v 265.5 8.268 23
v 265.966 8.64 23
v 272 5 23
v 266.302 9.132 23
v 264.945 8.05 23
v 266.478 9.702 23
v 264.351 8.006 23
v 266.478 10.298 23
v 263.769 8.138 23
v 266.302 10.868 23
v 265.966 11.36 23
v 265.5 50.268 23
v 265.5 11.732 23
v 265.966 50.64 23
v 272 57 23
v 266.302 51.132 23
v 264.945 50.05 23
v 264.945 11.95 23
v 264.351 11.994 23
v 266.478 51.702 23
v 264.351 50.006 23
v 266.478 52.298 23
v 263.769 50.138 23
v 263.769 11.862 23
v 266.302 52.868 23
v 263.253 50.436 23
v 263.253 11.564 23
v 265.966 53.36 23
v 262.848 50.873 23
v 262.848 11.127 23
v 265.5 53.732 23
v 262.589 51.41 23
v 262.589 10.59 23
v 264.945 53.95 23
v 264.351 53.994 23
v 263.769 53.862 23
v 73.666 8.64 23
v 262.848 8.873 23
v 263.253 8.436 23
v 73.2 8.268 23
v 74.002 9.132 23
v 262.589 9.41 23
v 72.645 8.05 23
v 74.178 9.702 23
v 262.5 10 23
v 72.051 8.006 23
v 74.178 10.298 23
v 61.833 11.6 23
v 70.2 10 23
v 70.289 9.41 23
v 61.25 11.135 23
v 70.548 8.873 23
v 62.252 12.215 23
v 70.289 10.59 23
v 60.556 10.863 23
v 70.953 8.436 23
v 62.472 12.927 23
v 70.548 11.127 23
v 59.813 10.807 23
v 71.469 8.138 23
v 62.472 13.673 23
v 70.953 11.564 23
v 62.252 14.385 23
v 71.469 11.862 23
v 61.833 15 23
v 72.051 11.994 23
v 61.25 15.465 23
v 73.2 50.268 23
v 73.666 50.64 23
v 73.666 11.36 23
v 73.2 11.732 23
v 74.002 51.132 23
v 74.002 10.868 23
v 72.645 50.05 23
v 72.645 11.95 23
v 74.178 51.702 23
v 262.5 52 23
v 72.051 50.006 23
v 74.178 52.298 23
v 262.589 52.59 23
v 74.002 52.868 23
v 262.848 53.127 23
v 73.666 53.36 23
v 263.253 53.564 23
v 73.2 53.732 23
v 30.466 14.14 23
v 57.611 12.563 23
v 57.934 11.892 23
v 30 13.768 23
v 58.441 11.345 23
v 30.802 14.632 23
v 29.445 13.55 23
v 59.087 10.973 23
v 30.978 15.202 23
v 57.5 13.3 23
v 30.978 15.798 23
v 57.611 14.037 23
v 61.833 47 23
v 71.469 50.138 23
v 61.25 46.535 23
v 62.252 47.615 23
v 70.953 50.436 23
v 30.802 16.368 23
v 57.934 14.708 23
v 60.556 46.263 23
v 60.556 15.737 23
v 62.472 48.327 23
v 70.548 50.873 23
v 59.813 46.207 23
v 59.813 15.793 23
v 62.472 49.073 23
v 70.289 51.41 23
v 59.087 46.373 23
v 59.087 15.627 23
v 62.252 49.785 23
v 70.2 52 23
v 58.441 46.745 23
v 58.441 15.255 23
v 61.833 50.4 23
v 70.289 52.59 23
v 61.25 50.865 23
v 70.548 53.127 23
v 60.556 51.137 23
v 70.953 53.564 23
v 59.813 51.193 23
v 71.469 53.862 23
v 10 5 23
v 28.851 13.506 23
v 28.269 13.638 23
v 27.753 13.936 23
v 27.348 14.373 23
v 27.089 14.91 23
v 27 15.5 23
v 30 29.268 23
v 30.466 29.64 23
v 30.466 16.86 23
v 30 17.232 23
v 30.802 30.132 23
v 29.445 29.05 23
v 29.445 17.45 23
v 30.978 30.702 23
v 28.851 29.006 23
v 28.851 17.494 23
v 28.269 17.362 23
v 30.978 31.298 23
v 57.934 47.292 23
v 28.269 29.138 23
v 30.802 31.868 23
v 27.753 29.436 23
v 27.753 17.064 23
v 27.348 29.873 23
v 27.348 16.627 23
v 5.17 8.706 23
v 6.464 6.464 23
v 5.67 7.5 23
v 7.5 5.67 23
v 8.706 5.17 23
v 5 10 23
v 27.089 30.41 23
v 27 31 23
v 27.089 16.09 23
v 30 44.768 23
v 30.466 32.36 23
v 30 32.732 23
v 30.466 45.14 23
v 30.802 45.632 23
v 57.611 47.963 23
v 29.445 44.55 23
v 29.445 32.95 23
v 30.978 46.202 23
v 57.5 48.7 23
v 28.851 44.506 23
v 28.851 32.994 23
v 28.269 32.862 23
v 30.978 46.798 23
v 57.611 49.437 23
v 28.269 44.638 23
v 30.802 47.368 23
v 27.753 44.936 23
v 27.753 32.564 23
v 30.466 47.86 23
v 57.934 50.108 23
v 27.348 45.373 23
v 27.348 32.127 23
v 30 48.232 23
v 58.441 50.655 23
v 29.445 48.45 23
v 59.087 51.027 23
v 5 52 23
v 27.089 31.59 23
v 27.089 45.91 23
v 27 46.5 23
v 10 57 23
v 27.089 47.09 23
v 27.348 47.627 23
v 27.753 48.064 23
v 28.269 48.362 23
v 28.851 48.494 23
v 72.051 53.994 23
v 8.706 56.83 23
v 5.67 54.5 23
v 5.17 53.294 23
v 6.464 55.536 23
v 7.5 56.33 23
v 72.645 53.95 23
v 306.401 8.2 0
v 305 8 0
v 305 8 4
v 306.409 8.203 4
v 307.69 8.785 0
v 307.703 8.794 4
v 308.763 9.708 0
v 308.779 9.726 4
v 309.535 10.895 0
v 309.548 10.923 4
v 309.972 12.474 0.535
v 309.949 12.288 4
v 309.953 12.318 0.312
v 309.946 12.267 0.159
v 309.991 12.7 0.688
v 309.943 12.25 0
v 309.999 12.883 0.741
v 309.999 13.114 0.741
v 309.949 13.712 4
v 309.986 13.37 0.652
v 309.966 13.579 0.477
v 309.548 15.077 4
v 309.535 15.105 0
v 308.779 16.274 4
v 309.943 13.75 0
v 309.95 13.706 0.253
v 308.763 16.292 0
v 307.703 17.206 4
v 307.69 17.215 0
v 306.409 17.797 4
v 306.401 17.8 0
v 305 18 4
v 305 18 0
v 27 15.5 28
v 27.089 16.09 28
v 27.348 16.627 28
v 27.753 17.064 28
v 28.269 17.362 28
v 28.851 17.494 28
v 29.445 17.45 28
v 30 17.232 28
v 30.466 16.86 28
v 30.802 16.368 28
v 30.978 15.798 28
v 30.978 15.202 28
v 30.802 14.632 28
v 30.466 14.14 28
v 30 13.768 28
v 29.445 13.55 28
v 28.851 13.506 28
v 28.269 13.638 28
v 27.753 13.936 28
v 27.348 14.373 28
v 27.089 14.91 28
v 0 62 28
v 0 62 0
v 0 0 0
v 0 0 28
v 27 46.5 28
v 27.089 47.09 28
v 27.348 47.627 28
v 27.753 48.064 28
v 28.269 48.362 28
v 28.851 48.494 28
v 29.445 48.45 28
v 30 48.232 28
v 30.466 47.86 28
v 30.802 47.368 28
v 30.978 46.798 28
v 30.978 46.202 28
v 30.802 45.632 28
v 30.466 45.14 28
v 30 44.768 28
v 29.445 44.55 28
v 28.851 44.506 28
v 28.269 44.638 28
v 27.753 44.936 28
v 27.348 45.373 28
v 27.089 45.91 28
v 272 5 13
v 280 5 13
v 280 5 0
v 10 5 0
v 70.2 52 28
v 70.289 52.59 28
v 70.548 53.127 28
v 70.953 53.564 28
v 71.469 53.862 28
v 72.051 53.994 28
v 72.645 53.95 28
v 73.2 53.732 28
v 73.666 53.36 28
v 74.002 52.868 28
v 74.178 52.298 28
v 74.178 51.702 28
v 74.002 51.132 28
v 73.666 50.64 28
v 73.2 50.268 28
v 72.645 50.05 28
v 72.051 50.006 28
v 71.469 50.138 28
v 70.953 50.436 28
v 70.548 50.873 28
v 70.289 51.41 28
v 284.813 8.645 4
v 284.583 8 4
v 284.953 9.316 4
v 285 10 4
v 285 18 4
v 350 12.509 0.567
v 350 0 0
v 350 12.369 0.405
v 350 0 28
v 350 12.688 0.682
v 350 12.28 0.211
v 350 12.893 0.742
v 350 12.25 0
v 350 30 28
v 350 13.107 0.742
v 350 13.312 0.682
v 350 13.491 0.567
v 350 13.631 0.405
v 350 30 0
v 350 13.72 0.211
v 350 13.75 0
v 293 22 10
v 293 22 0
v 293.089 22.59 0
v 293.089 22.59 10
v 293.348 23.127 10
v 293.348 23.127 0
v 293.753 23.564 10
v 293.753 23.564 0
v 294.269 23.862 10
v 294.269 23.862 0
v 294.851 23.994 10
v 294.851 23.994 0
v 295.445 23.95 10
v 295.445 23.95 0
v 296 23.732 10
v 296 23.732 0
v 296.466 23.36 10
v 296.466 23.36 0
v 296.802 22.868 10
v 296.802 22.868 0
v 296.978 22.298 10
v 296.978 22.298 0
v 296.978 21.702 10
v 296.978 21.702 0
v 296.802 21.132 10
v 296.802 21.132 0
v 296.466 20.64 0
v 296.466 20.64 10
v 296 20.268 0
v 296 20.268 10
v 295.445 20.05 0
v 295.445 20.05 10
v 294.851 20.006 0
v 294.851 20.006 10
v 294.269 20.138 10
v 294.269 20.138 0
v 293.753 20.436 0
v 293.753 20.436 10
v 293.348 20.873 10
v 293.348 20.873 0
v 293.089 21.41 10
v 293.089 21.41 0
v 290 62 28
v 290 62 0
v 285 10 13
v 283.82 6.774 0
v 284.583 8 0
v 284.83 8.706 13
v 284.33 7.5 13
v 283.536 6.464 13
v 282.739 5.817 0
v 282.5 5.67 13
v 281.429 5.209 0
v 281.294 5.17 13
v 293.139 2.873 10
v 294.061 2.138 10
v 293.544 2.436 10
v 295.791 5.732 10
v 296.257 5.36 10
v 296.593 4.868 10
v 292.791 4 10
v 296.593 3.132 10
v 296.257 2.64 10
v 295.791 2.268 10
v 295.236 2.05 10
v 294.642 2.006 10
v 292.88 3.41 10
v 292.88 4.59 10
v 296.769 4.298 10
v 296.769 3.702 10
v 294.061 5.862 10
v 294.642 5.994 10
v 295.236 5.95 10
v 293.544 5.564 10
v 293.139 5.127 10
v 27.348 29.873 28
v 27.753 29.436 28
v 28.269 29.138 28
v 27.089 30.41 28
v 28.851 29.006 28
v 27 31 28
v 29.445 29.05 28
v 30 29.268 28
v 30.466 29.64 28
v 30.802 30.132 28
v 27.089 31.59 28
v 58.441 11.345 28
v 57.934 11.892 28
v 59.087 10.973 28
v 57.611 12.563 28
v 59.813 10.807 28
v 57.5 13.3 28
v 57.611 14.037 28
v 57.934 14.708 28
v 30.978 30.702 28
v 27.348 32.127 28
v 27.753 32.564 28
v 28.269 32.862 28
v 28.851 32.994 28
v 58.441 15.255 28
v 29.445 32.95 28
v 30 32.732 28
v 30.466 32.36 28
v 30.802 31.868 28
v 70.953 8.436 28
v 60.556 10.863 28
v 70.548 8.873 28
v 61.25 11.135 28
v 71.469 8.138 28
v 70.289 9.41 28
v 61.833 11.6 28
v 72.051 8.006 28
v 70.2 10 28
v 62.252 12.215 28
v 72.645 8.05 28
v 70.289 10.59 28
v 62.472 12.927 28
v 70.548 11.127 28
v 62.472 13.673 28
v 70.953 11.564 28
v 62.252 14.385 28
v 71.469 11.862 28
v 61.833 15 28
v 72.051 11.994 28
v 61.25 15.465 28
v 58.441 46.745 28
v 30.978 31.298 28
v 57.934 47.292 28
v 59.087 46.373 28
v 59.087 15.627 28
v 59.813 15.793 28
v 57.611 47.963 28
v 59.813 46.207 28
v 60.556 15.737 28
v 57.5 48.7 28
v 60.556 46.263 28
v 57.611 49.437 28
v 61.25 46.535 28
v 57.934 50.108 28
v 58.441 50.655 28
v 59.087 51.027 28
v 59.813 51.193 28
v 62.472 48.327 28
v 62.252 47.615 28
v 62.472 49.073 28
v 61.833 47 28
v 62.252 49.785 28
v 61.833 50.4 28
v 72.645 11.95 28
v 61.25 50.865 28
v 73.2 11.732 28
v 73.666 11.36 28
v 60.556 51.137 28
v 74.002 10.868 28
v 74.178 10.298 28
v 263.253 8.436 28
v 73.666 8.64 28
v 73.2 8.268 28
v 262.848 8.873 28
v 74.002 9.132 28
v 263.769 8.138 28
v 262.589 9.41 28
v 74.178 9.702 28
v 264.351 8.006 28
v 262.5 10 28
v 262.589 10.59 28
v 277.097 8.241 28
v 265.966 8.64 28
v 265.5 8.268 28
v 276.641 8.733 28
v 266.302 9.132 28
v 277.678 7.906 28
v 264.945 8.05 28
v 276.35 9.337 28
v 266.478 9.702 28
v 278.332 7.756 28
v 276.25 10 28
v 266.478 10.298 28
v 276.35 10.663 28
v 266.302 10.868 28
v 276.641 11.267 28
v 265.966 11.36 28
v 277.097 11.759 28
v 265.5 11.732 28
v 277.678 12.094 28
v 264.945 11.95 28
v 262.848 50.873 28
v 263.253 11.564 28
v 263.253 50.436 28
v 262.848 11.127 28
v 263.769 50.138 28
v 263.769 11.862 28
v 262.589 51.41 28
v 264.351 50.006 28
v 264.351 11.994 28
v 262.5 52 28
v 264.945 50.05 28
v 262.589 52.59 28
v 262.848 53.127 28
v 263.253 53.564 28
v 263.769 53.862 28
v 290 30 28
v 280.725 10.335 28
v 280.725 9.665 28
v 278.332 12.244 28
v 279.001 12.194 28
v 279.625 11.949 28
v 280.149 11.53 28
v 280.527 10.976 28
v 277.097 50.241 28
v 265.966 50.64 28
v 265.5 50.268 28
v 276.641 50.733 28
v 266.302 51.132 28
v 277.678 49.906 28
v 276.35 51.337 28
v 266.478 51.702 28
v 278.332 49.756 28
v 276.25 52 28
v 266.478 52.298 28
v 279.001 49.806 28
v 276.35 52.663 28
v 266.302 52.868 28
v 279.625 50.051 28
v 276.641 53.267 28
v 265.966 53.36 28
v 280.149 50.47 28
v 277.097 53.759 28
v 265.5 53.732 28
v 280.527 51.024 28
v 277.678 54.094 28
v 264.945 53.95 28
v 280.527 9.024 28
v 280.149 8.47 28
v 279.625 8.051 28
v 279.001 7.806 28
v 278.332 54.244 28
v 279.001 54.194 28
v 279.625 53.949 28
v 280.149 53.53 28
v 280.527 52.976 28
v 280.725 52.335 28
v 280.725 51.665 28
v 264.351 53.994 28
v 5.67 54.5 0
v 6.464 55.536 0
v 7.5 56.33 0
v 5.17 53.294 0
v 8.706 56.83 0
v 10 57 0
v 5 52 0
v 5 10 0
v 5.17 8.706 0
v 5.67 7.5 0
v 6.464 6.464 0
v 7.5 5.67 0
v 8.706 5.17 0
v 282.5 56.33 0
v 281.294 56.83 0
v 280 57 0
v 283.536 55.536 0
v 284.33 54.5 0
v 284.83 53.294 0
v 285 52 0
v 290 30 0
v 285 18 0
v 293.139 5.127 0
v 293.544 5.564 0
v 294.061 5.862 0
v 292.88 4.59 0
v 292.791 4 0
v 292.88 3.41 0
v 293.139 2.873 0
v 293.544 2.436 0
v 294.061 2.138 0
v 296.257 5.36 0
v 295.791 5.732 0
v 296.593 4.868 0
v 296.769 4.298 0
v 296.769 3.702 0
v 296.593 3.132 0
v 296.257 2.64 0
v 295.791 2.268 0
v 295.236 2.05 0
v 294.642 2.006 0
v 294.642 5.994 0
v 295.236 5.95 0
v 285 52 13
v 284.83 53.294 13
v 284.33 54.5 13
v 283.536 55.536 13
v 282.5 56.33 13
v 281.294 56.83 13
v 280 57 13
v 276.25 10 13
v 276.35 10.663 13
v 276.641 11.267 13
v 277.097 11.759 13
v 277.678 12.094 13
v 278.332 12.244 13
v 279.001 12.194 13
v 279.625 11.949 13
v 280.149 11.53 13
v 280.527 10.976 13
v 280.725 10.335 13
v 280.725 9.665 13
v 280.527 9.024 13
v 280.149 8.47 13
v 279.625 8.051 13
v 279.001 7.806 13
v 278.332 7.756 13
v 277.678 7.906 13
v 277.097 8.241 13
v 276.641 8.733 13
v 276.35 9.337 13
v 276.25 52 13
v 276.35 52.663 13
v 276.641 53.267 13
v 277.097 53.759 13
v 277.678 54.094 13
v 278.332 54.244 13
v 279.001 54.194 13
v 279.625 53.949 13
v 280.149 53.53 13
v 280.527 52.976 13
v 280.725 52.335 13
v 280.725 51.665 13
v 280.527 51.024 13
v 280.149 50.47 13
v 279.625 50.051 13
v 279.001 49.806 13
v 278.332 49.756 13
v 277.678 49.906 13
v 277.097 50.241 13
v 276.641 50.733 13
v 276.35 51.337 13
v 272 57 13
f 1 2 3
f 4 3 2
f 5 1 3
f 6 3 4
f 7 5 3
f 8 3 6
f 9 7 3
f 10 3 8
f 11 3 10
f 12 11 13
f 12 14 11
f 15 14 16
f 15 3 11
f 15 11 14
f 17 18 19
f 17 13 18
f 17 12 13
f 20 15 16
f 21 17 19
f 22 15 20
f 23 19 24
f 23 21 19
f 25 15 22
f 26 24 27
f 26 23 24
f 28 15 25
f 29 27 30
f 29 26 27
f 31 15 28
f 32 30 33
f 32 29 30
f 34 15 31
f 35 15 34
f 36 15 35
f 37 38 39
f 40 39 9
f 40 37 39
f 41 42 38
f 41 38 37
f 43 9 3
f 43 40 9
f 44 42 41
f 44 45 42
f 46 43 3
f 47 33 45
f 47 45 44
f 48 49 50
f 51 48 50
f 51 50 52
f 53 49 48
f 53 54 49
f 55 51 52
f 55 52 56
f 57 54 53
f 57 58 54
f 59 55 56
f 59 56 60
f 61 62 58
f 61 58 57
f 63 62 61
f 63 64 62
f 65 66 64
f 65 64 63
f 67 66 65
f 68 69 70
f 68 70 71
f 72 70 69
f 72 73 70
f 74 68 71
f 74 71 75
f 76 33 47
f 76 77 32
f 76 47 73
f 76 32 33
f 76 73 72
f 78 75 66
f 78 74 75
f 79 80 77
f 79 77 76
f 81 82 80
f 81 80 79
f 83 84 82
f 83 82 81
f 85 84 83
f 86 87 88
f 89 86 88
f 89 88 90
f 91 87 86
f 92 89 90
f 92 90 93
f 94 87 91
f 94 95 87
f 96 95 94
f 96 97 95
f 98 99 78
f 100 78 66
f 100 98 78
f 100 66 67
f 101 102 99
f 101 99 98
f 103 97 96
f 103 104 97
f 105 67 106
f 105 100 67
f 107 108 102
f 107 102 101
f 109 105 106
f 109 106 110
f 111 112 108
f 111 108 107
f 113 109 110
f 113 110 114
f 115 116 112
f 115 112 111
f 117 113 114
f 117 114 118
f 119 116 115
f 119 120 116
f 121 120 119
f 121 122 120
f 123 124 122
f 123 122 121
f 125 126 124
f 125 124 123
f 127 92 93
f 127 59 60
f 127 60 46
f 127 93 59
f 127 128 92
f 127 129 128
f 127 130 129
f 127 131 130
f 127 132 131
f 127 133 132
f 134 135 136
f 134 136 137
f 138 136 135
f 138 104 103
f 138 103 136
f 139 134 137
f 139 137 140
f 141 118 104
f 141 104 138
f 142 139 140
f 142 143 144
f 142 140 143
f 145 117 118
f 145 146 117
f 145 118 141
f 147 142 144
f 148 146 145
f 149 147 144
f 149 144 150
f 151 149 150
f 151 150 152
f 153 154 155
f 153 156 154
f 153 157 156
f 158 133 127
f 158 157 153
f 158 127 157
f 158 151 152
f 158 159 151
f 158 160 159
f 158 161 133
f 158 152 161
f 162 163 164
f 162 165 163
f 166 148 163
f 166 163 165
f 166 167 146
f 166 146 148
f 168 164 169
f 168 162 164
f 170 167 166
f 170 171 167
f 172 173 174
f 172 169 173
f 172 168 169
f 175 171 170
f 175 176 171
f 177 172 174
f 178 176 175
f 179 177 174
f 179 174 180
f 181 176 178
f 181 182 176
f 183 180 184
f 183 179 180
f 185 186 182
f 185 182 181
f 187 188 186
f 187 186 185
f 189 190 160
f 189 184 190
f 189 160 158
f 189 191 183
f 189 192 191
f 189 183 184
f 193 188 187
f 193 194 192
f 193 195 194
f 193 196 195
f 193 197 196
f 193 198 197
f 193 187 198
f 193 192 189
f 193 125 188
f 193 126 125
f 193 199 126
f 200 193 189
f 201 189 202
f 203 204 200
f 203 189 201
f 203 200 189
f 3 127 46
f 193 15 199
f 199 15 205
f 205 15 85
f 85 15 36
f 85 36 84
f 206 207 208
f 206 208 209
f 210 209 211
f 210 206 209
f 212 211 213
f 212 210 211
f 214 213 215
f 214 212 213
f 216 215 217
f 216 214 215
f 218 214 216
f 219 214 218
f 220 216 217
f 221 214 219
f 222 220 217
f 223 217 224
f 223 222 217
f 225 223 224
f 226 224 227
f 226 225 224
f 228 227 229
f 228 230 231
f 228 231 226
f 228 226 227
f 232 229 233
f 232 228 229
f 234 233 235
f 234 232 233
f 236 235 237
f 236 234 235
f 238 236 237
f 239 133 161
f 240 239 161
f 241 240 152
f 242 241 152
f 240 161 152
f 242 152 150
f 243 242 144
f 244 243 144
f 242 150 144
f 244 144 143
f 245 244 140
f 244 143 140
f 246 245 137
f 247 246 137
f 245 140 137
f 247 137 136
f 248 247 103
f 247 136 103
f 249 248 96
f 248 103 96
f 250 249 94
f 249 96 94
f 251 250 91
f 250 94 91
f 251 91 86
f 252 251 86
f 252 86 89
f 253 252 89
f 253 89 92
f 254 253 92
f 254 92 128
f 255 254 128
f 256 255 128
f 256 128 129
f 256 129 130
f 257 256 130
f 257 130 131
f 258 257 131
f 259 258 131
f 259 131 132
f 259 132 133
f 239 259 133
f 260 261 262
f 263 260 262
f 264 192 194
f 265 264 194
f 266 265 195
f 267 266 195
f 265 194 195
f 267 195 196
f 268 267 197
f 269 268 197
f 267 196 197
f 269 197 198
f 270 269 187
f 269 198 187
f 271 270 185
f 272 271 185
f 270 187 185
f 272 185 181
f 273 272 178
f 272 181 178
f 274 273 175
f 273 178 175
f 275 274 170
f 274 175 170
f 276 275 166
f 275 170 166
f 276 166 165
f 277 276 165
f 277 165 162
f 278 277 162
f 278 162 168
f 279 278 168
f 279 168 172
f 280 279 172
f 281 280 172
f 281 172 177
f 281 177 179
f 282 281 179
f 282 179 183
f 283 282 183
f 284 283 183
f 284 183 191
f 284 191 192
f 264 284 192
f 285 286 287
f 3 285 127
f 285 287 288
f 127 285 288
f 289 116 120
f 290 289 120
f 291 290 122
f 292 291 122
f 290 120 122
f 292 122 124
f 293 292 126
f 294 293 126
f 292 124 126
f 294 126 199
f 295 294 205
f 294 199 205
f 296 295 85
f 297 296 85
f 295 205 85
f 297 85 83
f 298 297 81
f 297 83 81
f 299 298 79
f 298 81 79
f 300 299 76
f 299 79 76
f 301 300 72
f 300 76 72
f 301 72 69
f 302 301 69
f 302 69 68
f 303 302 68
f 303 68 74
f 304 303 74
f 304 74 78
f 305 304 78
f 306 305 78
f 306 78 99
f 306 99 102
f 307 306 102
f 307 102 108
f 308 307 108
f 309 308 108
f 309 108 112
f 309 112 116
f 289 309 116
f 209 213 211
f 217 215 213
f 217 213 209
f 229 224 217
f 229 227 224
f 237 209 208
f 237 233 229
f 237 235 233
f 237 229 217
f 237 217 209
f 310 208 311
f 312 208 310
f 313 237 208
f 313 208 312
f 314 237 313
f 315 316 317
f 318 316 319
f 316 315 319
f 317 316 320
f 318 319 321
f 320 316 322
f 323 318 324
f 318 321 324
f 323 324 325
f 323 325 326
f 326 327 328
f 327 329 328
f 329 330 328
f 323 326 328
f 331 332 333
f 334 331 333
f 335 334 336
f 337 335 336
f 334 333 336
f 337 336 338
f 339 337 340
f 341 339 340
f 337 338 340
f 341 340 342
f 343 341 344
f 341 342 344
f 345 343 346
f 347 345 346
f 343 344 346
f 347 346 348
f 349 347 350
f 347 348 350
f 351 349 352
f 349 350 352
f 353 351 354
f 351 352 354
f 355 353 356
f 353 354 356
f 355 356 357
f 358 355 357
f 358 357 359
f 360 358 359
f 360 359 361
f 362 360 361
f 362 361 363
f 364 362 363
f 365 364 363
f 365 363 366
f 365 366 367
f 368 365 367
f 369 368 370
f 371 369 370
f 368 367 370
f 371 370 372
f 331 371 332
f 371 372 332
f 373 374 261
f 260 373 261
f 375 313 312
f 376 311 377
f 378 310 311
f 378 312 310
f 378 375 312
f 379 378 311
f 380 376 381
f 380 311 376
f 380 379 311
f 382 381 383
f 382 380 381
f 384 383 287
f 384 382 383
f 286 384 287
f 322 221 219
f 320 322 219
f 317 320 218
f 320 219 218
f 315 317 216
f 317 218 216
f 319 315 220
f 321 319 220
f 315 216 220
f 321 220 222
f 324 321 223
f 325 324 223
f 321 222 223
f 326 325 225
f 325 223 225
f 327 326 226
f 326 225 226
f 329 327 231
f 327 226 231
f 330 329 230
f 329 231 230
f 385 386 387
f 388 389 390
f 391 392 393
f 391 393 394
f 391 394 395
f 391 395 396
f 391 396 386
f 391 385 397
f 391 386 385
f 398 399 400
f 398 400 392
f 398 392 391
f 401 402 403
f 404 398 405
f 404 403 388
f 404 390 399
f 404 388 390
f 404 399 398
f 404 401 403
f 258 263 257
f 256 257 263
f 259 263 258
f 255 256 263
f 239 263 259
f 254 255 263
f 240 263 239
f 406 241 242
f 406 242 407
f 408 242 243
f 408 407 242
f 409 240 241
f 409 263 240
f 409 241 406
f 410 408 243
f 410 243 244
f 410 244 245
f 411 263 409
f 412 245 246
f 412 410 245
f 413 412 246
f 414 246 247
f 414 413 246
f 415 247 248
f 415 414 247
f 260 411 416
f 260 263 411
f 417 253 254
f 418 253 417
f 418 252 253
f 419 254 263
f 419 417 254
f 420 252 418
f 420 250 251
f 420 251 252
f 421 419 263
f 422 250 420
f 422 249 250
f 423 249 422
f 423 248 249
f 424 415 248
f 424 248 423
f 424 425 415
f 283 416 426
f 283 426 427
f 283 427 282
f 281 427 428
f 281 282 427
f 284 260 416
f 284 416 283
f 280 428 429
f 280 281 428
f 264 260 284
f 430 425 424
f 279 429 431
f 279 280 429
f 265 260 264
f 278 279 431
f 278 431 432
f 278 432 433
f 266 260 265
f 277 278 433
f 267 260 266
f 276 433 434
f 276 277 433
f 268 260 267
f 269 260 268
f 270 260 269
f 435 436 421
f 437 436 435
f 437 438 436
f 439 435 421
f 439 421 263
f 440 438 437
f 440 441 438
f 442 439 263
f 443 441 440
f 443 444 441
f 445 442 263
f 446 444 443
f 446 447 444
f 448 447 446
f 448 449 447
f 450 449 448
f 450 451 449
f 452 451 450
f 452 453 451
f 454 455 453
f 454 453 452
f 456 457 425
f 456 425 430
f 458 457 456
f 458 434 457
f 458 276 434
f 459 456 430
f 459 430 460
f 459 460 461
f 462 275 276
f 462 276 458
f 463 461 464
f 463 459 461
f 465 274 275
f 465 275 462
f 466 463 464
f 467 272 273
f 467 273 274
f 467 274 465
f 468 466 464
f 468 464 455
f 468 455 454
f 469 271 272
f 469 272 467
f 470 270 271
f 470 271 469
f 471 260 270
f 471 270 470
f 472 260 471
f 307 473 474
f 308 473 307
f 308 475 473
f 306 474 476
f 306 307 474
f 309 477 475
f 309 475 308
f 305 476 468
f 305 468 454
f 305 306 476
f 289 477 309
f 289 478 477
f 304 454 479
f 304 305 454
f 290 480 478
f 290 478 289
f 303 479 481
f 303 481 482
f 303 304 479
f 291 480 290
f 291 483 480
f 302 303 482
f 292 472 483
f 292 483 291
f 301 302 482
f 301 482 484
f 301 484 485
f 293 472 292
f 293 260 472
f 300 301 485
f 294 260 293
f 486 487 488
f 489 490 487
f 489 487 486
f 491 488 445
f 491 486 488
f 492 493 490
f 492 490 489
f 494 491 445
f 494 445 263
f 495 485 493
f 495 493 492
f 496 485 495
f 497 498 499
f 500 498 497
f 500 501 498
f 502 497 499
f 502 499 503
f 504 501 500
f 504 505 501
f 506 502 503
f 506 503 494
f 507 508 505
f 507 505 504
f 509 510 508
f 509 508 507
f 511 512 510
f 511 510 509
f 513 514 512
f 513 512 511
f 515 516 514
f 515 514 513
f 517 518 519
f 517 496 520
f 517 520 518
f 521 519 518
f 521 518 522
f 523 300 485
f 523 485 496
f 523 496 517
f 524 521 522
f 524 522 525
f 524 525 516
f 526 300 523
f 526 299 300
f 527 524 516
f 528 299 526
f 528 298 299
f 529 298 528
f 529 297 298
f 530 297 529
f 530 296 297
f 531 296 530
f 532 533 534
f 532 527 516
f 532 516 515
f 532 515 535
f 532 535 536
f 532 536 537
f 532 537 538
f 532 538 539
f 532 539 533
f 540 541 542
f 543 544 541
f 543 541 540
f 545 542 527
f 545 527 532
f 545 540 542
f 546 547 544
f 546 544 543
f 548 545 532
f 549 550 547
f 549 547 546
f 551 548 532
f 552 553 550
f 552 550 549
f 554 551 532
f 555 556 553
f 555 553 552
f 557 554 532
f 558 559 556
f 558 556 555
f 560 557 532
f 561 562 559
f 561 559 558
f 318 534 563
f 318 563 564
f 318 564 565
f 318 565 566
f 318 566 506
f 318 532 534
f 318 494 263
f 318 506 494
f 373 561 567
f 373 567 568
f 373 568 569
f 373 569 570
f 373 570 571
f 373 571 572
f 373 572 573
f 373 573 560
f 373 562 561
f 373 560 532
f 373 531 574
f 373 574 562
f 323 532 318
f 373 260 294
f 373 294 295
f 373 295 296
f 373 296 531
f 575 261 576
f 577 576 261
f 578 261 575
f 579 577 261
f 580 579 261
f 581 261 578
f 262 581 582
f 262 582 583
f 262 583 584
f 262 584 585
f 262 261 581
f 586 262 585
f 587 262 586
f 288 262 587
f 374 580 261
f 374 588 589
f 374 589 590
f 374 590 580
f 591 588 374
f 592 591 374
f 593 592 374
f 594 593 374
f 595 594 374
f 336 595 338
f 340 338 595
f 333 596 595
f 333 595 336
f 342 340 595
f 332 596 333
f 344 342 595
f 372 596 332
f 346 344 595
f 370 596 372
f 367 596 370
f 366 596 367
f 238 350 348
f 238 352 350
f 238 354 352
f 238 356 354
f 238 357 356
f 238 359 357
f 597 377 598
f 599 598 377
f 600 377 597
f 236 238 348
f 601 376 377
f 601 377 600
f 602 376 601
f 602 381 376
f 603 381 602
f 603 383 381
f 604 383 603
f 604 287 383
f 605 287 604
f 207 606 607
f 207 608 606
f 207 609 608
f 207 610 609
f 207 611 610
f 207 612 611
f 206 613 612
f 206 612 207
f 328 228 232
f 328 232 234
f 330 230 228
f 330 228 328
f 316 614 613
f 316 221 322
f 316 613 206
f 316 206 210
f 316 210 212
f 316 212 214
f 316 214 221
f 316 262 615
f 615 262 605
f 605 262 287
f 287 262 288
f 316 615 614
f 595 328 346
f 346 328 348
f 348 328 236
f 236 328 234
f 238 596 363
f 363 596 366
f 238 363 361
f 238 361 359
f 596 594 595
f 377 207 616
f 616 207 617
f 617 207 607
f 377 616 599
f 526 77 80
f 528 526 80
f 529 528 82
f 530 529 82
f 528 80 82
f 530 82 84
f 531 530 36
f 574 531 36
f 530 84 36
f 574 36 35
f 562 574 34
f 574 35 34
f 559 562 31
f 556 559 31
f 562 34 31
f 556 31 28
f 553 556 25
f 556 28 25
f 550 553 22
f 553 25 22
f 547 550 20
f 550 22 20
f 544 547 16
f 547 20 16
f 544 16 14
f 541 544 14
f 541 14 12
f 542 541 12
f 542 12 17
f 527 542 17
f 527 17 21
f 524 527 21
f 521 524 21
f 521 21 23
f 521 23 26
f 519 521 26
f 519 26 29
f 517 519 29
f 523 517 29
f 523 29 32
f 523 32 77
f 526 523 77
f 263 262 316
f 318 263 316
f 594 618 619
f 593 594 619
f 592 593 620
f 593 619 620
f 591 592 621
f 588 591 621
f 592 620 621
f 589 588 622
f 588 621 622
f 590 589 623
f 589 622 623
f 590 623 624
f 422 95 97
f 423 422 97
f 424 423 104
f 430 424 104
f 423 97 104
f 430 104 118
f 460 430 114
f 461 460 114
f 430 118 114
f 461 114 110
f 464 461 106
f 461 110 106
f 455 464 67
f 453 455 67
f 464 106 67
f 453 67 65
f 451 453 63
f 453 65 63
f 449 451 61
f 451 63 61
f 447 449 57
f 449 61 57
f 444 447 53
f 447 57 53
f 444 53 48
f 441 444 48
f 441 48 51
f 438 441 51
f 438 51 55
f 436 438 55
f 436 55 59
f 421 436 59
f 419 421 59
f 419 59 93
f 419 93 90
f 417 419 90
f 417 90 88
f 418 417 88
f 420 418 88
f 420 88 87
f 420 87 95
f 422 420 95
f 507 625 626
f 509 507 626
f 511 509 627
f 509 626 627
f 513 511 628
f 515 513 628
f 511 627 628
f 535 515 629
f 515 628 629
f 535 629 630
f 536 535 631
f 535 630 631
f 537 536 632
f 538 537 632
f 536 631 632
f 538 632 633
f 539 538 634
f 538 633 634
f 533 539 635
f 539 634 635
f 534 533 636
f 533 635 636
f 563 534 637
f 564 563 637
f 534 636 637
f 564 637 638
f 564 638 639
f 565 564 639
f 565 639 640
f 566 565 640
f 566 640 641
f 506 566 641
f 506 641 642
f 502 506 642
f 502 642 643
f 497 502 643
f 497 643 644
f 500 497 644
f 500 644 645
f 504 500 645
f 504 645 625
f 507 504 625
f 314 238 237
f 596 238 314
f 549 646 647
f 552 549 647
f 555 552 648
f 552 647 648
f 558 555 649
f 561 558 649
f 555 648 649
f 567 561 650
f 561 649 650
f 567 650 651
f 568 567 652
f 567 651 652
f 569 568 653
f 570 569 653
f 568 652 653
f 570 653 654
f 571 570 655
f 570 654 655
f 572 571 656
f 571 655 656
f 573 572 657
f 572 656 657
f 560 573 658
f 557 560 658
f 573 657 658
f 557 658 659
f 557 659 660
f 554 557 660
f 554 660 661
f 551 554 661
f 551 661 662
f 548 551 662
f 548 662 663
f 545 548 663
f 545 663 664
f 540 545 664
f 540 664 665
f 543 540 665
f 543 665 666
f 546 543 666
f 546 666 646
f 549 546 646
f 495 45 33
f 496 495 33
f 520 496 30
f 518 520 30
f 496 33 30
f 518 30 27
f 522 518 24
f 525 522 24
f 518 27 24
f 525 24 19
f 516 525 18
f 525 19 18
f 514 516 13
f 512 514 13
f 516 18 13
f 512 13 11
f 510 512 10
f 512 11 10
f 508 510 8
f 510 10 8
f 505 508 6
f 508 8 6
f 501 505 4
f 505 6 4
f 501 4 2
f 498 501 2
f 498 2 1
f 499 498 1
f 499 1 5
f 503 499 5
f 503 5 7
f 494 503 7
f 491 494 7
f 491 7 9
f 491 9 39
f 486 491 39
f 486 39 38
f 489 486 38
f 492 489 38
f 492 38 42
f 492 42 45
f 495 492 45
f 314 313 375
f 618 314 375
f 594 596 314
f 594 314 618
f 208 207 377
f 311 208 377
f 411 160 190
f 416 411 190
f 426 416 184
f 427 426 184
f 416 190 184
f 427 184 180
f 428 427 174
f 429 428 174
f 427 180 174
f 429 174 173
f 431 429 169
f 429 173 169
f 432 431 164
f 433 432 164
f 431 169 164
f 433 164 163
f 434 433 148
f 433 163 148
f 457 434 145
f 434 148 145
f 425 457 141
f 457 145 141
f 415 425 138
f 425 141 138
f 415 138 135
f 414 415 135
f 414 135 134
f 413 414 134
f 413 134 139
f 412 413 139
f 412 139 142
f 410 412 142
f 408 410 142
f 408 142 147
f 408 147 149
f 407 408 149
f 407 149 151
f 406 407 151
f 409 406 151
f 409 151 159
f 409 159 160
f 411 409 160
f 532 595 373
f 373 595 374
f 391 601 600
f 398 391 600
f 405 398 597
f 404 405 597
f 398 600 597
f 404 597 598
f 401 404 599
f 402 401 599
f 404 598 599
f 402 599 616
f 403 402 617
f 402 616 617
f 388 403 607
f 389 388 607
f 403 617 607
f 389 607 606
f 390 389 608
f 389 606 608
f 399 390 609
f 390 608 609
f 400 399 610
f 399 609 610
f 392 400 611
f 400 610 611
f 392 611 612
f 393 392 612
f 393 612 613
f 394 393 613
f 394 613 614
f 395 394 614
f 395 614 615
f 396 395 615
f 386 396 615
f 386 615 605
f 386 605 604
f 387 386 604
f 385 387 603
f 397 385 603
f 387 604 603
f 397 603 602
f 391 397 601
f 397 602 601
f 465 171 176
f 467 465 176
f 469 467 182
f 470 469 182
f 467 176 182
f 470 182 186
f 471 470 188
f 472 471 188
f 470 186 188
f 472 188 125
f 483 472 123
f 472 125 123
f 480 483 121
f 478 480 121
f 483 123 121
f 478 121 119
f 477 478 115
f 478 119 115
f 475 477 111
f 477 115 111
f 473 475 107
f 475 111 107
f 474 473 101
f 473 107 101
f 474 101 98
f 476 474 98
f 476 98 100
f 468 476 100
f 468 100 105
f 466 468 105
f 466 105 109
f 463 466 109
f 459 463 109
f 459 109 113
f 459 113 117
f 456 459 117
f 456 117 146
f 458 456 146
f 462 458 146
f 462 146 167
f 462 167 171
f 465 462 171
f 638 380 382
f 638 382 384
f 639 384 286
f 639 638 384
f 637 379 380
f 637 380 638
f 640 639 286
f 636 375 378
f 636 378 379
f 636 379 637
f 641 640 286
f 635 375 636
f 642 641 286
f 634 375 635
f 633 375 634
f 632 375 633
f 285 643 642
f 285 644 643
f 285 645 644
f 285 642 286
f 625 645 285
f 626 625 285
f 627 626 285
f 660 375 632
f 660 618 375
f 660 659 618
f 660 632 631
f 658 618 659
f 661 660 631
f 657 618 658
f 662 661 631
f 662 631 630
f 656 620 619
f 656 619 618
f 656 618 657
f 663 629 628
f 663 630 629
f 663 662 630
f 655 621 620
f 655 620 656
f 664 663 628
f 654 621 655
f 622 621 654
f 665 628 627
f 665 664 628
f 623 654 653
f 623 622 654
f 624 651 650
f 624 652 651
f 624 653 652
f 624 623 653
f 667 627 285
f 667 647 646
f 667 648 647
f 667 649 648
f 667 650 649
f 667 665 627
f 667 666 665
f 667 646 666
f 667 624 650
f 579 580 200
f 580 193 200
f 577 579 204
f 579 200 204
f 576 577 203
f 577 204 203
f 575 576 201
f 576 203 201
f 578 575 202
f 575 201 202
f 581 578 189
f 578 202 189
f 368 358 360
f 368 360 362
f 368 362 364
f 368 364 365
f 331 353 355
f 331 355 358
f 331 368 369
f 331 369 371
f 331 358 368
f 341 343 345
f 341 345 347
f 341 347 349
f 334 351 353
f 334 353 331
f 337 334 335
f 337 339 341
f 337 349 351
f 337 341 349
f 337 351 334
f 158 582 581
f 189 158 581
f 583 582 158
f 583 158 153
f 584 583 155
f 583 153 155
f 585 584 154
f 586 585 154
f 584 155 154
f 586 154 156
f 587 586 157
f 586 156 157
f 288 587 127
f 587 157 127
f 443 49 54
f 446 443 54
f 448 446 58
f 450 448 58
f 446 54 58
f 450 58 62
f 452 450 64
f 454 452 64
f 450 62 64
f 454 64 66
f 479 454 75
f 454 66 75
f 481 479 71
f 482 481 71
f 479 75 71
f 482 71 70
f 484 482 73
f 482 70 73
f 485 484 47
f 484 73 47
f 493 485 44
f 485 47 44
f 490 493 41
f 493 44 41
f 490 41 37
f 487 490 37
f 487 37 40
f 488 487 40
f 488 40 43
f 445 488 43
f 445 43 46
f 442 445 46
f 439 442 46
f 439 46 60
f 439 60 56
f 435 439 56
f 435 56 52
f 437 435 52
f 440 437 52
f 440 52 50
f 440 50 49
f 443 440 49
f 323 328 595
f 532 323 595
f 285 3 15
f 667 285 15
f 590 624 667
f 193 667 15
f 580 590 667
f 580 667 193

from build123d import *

# Parameters (mm, degrees)
RESSALTO_EXTRUS_O1_DEPTH = 28
ESBO_O2_W                = 280
ESBO_O2_H                = 52
CORTE_EXTRUS_O1_DEPTH    = 23
FILETE6_R                = 5
RESSALTO_EXTRUS_O2_DEPTH = 10
ESBO_O4_R                = 2
CORTE_EXTRUS_O3_DEPTH    = 357.192363759
ESBO_O5_R                = 2
CORTE_EXTRUS_O4_DEPTH    = 357.192363759
ESBO_O6_R                = 2.25
CORTE_EXTRUS_O5_DEPTH    = 356.76537212
ESBO_O7_R                = 2.5
CORTE_EXTRUS_O6_DEPTH    = 10
ESBO_O13_R               = 2
CORTE_EXTRUS_O12_DEPTH   = 357.192363759
ESBO_O15_W               = 30
ESBO_O15_H               = 10
CORTE_EXTRUS_O13_DEPTH   = 4
ESBO_O16_R               = 0.75
CORTE_EXTRUS_O14_DEPTH   = 318.376747731
FILETE7_R                = 5
ESBO_O17_R               = 2
CORTE_EXTRUS_O15_DEPTH   = 10


with BuildPart() as part:
    # Esboço1 → Ressalto-extrusão1 (new body)
    with BuildSketch(Plane.XY):
        Polygon((350, 30), (290, 30), (290, 62), (0, 62), (0, 0), (290, 0), (350, 0), align=None)
    extrude(amount=RESSALTO_EXTRUS_O1_DEPTH)

    # Esboço2 → Corte-extrusão1 (cut)
    with BuildSketch(Plane(origin=(0, 0, 0), x_dir=(-1, 0, 0), z_dir=(0, 0, -1))):
        with Locations((-145, 31)):
            Rectangle(ESBO_O2_W, ESBO_O2_H)
    extrude(amount=-CORTE_EXTRUS_O1_DEPTH, mode=Mode.SUBTRACT)

    # Filete6
    filete6_edges = [part.edges().sort_by_distance(p)[0] for p in [
        (285, 5, 11.5),
        (285, 57, 11.5),
        (5, 57, 11.5),
        (5, 5, 11.5),
    ]]
    fillet(filete6_edges, radius=FILETE6_R)

    # Esboço3 → Ressalto-extrusão2 (add)
    with BuildSketch(Plane(origin=(0, 0, 23), x_dir=(-1, 0, 0), z_dir=(0, 0, -1))):
        with BuildLine():
            Line((-272, 30), (-272, 57))
            Line((-272, 57), (-280, 57))
            ThreePointArc((-280, 57), (-283.535533906, 55.535533906), (-285, 52))
            Line((-285, 52), (-285, 10))
            ThreePointArc((-285, 10), (-283.535533906, 6.464466094), (-280, 5))
            Line((-280, 5), (-272, 5))
            Line((-272, 5), (-272, 30))
        make_face()
    extrude(amount=RESSALTO_EXTRUS_O2_DEPTH)

    # Esboço4 → Corte-extrusão3 (cut, through all)
    with BuildSketch(Plane(origin=(0, 0, 23), x_dir=(-1, 0, 0), z_dir=(0, 0, -1))):
        with Locations((-72.2, 10)):
            Circle(ESBO_O4_R)
        with Locations((-72.2, 52)):
            Circle(ESBO_O4_R)
    extrude(amount=-CORTE_EXTRUS_O3_DEPTH, mode=Mode.SUBTRACT)

    # Esboço5 → Corte-extrusão4 (cut, through all)
    with BuildSketch(Plane(origin=(0, 0, 23), x_dir=(-1, 0, 0), z_dir=(0, 0, -1))):
        with Locations((-264.5, 52)):
            Circle(ESBO_O5_R)
        with Locations((-264.5, 10)):
            Circle(ESBO_O5_R)
    extrude(amount=-CORTE_EXTRUS_O4_DEPTH, mode=Mode.SUBTRACT)

    # Esboço6 → Corte-extrusão5 (cut, through all)
    with BuildSketch(Plane(origin=(0, 0, 13), x_dir=(-1, 0, 0), z_dir=(0, 0, -1))):
        with Locations((-278.5, 10)):
            Circle(ESBO_O6_R)
        with Locations((-278.5, 52)):
            Circle(ESBO_O6_R)
    extrude(amount=-CORTE_EXTRUS_O5_DEPTH, mode=Mode.SUBTRACT)

    # Esboço7 → Corte-extrusão6 (cut)
    with BuildSketch(Plane(origin=(0, 0, 23), x_dir=(-1, 0, 0), z_dir=(0, 0, -1))):
        with Locations((-60, 48.7)):
            Circle(ESBO_O7_R)
        with Locations((-60, 13.3)):
            Circle(ESBO_O7_R)
    extrude(amount=-CORTE_EXTRUS_O6_DEPTH, mode=Mode.SUBTRACT)

    # Esboço13 → Corte-extrusão12 (cut, through all)
    with BuildSketch(Plane(origin=(0, 0, 23), x_dir=(-1, 0, 0), z_dir=(0, 0, -1))):
        with Locations((-29, 46.5)):
            Circle(ESBO_O13_R)
        with Locations((-29, 31)):
            Circle(ESBO_O13_R)
        with Locations((-29, 15.5)):
            Circle(ESBO_O13_R)
    extrude(amount=-CORTE_EXTRUS_O12_DEPTH, mode=Mode.SUBTRACT)

    # Esboço15 → Corte-extrusão13 (cut)
    with BuildSketch(Plane(origin=(0, 0, 0), x_dir=(-1, 0, 0), z_dir=(0, 0, -1))):
        with Locations((-295, 13)):
            Rectangle(ESBO_O15_W, ESBO_O15_H)
    extrude(amount=-CORTE_EXTRUS_O13_DEPTH, mode=Mode.SUBTRACT)

    # Esboço16 → Corte-extrusão14 (cut, through all)
    with BuildSketch(Plane.ZY.offset(-310)):
        with Locations((0, 13)):
            Circle(ESBO_O16_R)
    extrude(amount=-CORTE_EXTRUS_O14_DEPTH, mode=Mode.SUBTRACT)

    # Filete7
    # the kernel refuses this fillet: 5 mm, written as the material it adds along each edge
    with BuildSketch(Plane(origin=(310, 18, 0), x_dir=(-1, 0, 0), z_dir=(0, 0, 1))) as filete7_piece_1_section:
        with BuildLine():
            CenterArc((FILETE7_R, FILETE7_R), FILETE7_R, 180, 90)
            Line((0, FILETE7_R), (0, 0))
            Line((0, 0), (FILETE7_R, 0))
        make_face()
    filete7_piece_1 = extrude(amount=16.5, mode=Mode.PRIVATE)
    filete7_piece_1 = filete7_piece_1 - Plane(origin=(308.865698772, 13, 0), x_dir=(0, 0, 1), z_dir=(-1, 0, 0)) * Cylinder(0.75, 53, mode=Mode.PRIVATE)
    add(filete7_piece_1)
    with BuildSketch(Plane(origin=(310, 8, 0), x_dir=(-1, 0, 0), z_dir=(0, 0, 1))) as filete7_piece_2_section:
        with BuildLine():
            CenterArc((FILETE7_R, -FILETE7_R), FILETE7_R, 90, 90)
            Line((0, -FILETE7_R), (0, 0))
            Line((0, 0), (FILETE7_R, 0))
        make_face()
    filete7_piece_2 = extrude(amount=16.5, mode=Mode.PRIVATE)
    filete7_piece_2 = filete7_piece_2 - Plane(origin=(308.865698858, 13, 0), x_dir=(0, 0, 1), z_dir=(-1, 0, 0)) * Cylinder(0.75, 54, mode=Mode.PRIVATE)
    add(filete7_piece_2)

    # Esboço17 → Corte-extrusão15 (cut)
    with BuildSketch(Plane(origin=(0, 0, 0), x_dir=(-1, 0, 0), z_dir=(0, 0, -1))):
        with Locations((-294.791287847, 4)):
            Circle(ESBO_O17_R)
        with Locations((-295, 22)):
            Circle(ESBO_O17_R)
    extrude(amount=-CORTE_EXTRUS_O15_DEPTH, mode=Mode.SUBTRACT)


solid = part.part
